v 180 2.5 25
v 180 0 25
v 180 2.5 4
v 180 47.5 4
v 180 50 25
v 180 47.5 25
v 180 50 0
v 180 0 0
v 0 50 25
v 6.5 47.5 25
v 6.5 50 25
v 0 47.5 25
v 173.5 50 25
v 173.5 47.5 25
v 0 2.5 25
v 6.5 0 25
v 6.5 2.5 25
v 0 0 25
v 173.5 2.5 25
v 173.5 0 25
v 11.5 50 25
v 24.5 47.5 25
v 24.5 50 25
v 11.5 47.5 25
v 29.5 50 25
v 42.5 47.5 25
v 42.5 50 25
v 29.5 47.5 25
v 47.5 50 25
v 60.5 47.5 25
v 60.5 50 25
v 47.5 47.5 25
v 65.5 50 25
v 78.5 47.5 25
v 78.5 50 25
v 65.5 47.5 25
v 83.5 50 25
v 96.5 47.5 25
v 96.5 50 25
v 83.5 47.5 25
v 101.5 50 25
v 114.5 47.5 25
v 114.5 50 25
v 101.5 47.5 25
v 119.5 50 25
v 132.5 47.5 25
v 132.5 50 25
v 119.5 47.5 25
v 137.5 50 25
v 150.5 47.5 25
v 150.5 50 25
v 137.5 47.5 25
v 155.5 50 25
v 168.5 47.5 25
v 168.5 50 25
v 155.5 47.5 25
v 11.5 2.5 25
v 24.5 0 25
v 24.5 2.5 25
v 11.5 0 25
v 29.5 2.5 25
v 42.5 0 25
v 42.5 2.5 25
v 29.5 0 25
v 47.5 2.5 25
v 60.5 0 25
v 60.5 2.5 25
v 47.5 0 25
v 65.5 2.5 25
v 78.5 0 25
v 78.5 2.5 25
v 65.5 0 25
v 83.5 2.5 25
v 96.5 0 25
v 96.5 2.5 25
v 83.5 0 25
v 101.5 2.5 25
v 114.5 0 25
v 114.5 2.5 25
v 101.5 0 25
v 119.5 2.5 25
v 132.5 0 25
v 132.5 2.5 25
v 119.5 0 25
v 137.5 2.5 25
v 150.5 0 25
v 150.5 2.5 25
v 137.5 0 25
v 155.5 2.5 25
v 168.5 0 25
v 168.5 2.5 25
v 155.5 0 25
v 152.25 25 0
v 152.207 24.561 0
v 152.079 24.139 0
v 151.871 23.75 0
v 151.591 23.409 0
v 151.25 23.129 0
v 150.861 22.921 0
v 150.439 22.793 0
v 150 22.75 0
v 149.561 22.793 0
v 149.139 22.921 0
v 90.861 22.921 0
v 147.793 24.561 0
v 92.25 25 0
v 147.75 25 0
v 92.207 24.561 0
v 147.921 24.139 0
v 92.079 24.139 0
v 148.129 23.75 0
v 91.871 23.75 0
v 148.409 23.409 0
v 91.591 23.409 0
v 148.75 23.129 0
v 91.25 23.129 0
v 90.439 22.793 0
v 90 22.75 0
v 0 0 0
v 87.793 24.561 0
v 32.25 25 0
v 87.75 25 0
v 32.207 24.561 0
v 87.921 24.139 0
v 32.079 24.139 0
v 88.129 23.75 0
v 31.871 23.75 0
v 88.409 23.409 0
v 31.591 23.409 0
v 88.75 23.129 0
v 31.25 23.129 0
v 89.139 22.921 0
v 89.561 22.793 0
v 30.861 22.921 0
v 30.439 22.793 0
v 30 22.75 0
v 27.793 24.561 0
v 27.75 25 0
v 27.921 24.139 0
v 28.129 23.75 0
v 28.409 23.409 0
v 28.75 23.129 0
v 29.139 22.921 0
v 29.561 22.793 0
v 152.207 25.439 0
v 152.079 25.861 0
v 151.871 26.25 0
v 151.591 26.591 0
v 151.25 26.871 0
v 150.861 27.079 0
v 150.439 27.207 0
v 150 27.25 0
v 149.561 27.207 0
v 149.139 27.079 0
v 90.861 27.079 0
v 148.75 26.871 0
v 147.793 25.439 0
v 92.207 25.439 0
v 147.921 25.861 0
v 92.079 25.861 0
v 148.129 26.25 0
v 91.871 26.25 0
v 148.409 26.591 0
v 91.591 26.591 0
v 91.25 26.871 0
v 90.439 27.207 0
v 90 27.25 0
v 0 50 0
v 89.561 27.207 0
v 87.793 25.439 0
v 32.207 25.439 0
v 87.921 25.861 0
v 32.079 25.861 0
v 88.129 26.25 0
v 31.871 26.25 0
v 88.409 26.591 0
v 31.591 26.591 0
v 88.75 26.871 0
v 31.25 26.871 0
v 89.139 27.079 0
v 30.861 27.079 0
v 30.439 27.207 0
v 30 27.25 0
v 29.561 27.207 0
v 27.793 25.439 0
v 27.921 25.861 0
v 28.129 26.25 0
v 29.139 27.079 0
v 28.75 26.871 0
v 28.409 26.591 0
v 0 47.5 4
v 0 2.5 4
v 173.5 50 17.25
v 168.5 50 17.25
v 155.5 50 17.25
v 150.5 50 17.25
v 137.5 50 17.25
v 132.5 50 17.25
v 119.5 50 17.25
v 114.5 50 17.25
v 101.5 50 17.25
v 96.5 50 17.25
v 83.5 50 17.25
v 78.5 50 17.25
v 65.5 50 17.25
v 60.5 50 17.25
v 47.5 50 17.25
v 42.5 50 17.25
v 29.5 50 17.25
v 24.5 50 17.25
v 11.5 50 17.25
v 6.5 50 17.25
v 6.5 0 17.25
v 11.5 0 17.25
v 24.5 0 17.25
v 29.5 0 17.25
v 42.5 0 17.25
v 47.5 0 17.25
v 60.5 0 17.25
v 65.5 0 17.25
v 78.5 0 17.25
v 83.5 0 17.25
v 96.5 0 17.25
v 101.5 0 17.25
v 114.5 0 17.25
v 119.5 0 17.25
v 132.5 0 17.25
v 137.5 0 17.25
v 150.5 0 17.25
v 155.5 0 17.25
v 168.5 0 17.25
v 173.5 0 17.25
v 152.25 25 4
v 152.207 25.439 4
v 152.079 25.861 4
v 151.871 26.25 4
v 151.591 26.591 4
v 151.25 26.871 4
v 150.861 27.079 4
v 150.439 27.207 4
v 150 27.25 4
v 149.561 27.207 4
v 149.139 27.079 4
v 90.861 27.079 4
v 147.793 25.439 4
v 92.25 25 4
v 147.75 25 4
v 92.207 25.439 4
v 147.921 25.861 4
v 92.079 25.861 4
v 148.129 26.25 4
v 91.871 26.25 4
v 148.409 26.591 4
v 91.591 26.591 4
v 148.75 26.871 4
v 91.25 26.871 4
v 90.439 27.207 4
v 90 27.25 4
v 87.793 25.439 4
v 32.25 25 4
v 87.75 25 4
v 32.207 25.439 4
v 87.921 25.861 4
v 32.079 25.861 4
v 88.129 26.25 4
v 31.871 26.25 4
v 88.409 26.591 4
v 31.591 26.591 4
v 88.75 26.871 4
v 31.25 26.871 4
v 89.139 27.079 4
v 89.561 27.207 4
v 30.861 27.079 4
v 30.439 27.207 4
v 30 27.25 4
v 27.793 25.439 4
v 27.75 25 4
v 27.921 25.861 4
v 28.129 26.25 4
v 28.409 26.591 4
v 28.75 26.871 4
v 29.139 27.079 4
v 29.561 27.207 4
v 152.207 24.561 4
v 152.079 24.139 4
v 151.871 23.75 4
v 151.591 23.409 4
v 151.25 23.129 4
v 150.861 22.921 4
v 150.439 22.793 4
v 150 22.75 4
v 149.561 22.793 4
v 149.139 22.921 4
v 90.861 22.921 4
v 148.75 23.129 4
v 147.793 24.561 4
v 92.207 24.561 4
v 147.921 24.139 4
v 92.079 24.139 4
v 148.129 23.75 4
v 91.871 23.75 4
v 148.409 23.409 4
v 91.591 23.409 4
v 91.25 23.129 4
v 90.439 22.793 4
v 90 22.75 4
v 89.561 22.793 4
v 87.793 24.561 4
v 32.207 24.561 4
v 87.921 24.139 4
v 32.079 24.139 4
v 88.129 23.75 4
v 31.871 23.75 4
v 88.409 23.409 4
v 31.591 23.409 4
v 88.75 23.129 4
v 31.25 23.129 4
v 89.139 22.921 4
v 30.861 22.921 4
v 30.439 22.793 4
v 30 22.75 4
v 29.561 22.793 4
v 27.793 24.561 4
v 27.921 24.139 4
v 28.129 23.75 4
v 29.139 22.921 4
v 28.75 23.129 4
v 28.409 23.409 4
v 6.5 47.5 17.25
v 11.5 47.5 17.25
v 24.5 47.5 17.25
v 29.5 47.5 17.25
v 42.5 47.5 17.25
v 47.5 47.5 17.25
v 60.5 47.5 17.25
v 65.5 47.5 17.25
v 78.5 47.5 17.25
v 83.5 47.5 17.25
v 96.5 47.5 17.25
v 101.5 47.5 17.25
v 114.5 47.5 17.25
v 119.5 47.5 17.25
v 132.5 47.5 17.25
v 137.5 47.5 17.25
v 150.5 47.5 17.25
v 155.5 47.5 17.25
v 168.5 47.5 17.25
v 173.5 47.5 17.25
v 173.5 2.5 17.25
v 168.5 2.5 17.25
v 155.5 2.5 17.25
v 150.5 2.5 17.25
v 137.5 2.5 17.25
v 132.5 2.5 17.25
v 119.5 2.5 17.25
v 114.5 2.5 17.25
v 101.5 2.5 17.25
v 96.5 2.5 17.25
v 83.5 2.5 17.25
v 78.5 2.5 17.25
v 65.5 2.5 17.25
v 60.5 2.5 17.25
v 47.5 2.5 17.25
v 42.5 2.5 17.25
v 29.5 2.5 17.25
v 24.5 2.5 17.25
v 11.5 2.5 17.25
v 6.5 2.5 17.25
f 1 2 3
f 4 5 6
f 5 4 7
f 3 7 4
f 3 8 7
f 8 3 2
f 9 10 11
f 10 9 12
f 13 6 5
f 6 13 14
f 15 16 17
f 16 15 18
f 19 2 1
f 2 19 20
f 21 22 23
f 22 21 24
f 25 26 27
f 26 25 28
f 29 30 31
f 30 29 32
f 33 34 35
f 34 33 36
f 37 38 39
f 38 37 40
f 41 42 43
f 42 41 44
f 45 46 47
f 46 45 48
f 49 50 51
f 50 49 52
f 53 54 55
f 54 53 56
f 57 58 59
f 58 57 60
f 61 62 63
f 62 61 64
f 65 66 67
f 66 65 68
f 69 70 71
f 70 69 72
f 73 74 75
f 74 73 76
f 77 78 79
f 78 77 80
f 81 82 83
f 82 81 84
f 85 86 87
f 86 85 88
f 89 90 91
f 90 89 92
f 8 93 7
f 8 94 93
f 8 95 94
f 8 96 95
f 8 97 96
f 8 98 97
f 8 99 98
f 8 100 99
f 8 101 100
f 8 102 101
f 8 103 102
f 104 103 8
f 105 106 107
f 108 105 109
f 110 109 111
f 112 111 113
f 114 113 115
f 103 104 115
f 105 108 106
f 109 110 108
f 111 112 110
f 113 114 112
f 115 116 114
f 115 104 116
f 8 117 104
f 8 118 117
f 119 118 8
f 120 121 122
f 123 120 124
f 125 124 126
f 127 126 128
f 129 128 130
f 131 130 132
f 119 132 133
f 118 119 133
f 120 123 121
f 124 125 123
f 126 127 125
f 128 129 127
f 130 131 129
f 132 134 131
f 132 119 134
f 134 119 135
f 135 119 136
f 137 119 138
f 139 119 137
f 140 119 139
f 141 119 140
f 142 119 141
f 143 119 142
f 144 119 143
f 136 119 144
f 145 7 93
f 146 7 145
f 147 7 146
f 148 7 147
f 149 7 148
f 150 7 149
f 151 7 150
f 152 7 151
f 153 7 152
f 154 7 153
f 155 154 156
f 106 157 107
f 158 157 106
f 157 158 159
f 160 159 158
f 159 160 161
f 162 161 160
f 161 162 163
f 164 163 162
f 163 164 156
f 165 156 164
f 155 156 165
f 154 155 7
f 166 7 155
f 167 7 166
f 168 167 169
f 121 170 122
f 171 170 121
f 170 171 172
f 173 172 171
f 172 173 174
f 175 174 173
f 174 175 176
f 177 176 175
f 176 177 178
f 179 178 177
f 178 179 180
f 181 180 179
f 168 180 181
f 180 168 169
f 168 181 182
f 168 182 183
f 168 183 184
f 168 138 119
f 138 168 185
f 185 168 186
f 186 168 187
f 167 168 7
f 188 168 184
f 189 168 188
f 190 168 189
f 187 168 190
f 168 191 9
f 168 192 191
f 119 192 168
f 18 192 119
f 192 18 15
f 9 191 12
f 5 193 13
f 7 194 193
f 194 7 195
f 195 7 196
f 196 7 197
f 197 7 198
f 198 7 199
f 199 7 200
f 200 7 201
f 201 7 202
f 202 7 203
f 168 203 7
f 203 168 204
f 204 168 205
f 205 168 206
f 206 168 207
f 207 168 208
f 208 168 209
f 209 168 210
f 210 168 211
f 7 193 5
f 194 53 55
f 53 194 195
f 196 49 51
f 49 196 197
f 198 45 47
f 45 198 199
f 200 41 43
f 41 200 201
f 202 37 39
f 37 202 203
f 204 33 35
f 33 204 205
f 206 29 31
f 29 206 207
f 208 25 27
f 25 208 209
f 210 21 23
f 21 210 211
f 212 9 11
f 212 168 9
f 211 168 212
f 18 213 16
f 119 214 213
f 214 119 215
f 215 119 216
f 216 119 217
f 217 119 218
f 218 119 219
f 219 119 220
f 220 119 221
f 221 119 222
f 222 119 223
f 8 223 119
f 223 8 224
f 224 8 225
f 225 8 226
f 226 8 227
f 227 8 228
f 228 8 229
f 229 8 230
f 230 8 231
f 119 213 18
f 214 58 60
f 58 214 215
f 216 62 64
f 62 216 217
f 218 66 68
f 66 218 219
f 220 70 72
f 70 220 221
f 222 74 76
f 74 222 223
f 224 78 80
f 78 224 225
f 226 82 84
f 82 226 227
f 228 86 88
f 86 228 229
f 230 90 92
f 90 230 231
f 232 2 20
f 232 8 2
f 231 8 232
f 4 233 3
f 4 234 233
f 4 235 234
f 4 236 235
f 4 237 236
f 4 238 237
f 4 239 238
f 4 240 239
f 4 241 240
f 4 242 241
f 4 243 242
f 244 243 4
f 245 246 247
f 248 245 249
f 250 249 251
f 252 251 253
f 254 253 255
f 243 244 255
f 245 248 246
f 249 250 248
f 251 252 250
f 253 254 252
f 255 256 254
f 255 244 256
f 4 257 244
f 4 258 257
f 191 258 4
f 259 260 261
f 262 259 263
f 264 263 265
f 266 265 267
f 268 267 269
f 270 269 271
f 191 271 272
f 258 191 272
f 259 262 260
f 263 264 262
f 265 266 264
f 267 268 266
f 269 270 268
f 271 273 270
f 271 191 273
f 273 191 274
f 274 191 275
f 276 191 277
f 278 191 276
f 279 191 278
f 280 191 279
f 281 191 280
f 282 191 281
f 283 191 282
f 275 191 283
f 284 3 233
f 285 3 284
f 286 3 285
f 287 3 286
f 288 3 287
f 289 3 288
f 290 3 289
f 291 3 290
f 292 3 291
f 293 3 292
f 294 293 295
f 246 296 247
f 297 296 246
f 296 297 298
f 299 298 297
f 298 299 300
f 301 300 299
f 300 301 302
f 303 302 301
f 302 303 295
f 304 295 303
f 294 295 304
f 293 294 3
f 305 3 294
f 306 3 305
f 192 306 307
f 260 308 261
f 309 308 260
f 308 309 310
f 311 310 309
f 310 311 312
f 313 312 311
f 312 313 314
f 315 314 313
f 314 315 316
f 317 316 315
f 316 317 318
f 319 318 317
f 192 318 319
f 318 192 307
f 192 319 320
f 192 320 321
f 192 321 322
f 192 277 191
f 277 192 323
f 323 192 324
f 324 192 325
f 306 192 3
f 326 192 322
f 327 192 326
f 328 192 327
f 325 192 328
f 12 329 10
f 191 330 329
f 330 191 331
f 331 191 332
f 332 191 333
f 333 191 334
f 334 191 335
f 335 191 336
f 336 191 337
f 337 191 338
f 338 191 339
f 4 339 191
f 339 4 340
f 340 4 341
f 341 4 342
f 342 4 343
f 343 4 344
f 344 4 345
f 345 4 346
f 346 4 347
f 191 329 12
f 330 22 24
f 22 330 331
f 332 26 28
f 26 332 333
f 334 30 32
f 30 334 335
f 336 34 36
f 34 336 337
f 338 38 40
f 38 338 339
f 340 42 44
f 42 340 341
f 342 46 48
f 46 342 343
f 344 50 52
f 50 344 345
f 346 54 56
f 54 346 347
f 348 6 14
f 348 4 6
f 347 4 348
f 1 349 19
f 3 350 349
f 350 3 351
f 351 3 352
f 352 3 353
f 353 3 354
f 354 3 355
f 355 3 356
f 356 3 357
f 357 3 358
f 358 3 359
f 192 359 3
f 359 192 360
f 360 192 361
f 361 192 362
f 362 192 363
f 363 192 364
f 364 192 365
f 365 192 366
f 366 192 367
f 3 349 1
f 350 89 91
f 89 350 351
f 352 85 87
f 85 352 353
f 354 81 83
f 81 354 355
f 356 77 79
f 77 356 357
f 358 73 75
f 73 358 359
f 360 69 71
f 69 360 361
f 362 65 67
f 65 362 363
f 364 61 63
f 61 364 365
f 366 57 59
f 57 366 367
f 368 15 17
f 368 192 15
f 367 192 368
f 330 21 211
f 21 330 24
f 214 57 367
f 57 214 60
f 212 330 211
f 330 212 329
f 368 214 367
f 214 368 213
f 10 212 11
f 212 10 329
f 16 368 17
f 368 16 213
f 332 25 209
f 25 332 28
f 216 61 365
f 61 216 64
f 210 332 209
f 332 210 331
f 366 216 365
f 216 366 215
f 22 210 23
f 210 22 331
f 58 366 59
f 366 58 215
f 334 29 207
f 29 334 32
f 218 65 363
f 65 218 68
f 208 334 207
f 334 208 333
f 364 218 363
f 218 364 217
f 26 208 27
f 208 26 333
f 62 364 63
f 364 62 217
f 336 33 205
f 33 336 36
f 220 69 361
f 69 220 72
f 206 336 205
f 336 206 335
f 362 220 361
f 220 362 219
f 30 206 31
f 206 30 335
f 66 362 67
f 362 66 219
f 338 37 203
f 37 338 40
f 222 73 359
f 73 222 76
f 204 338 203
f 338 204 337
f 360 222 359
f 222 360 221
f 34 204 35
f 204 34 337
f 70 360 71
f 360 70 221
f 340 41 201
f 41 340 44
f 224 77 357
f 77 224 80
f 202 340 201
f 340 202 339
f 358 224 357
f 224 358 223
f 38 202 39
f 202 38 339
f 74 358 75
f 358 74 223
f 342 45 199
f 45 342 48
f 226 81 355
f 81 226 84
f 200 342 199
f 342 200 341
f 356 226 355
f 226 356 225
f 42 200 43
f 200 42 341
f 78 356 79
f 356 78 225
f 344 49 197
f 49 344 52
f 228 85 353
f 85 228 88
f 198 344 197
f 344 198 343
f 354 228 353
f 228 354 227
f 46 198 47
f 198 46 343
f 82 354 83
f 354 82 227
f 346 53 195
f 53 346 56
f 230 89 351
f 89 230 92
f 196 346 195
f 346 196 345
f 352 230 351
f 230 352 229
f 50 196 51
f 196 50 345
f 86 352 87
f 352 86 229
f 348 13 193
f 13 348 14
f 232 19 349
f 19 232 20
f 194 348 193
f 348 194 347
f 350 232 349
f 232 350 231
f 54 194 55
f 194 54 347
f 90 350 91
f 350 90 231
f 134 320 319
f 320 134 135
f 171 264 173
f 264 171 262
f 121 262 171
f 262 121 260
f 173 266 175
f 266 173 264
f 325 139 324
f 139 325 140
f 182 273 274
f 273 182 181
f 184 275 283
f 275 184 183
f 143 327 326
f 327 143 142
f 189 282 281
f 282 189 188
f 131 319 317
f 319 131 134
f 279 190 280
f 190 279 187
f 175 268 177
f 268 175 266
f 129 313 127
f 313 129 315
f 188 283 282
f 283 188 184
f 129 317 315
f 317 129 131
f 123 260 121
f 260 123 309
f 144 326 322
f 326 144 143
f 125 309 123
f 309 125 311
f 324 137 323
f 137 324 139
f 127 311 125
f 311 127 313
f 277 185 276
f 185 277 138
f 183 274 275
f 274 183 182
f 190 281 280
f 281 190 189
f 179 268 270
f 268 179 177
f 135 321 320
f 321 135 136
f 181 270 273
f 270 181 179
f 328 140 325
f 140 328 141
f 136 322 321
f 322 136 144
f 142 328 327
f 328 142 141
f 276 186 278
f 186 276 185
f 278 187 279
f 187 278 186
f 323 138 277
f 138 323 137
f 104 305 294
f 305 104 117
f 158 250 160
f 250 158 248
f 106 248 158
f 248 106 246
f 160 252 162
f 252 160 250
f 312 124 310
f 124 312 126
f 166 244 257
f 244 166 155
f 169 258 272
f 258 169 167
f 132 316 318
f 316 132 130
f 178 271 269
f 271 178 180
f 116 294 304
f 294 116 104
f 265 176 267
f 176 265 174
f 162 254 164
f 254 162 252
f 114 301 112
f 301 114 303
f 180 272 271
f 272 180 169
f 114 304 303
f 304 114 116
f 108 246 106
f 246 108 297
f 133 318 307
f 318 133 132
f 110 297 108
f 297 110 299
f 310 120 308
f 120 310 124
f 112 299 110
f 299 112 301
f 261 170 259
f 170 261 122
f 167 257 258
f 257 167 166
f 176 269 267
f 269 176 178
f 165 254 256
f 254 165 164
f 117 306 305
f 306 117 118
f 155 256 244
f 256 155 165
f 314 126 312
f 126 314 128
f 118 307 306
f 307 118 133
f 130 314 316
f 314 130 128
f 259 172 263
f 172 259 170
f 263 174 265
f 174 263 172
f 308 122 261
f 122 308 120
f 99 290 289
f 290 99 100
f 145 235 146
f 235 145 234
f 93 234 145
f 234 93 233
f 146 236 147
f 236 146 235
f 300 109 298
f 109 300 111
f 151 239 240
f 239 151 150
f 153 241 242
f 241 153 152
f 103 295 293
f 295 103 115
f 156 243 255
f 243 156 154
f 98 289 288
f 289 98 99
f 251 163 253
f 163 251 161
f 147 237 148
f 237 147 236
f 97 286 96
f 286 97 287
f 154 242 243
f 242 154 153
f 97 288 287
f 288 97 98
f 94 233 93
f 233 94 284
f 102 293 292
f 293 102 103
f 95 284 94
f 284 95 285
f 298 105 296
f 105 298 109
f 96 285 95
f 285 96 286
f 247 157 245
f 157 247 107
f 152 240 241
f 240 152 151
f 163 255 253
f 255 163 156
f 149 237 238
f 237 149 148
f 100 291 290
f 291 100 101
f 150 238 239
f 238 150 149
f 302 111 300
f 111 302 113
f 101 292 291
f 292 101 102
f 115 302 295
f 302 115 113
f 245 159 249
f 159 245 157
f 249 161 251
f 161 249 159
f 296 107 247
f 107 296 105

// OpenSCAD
$fn = 32;

// ----------------------------------------------------------------------
// Cable duct: 180 x 50 x 25 mm, 10 fingers
// ----------------------------------------------------------------------

// --- parameters (mm) ---
channel_l = 180;          // duct length, X
channel_w = 50;           // duct width, Y
channel_h = 25;           // duct height, Z
channel_t = 2.5;          // side wall thickness
floor_t = 4;              // floor thickness
slot_w = 5;               // finger slot width
slot_h = 13.25;           // finger slot height
fingers = 10;             // number of finger slots per side
pitch = 18;               // finger pitch
hole_d = 4.5;             // floor mounting hole
hole_n = 3;               // mounting holes in the floor

module shell() {
  difference() {
    cube([channel_l, channel_w, channel_h]);
    /* open top channel */
    translate([-channel_t - 1, channel_t, floor_t])
      cube([channel_l + 2 * channel_t + 2, channel_w - 2 * channel_t, channel_h + 1]);
  }
}

difference() {
  union() {
    shell();
  }
  /* finger slots cut through both side walls */
  for (i = [0 : fingers - 1]) translate([pitch / 2 + i * pitch - slot_w / 2, -1, floor_t + slot_h]) cube([slot_w, channel_w + 2, channel_h]);
  for (i = [0 : hole_n - 1]) translate([(channel_l / hole_n) * (i + 0.5), channel_w / 2, -1]) cylinder(h = floor_t + 2, d = hole_d);
}
